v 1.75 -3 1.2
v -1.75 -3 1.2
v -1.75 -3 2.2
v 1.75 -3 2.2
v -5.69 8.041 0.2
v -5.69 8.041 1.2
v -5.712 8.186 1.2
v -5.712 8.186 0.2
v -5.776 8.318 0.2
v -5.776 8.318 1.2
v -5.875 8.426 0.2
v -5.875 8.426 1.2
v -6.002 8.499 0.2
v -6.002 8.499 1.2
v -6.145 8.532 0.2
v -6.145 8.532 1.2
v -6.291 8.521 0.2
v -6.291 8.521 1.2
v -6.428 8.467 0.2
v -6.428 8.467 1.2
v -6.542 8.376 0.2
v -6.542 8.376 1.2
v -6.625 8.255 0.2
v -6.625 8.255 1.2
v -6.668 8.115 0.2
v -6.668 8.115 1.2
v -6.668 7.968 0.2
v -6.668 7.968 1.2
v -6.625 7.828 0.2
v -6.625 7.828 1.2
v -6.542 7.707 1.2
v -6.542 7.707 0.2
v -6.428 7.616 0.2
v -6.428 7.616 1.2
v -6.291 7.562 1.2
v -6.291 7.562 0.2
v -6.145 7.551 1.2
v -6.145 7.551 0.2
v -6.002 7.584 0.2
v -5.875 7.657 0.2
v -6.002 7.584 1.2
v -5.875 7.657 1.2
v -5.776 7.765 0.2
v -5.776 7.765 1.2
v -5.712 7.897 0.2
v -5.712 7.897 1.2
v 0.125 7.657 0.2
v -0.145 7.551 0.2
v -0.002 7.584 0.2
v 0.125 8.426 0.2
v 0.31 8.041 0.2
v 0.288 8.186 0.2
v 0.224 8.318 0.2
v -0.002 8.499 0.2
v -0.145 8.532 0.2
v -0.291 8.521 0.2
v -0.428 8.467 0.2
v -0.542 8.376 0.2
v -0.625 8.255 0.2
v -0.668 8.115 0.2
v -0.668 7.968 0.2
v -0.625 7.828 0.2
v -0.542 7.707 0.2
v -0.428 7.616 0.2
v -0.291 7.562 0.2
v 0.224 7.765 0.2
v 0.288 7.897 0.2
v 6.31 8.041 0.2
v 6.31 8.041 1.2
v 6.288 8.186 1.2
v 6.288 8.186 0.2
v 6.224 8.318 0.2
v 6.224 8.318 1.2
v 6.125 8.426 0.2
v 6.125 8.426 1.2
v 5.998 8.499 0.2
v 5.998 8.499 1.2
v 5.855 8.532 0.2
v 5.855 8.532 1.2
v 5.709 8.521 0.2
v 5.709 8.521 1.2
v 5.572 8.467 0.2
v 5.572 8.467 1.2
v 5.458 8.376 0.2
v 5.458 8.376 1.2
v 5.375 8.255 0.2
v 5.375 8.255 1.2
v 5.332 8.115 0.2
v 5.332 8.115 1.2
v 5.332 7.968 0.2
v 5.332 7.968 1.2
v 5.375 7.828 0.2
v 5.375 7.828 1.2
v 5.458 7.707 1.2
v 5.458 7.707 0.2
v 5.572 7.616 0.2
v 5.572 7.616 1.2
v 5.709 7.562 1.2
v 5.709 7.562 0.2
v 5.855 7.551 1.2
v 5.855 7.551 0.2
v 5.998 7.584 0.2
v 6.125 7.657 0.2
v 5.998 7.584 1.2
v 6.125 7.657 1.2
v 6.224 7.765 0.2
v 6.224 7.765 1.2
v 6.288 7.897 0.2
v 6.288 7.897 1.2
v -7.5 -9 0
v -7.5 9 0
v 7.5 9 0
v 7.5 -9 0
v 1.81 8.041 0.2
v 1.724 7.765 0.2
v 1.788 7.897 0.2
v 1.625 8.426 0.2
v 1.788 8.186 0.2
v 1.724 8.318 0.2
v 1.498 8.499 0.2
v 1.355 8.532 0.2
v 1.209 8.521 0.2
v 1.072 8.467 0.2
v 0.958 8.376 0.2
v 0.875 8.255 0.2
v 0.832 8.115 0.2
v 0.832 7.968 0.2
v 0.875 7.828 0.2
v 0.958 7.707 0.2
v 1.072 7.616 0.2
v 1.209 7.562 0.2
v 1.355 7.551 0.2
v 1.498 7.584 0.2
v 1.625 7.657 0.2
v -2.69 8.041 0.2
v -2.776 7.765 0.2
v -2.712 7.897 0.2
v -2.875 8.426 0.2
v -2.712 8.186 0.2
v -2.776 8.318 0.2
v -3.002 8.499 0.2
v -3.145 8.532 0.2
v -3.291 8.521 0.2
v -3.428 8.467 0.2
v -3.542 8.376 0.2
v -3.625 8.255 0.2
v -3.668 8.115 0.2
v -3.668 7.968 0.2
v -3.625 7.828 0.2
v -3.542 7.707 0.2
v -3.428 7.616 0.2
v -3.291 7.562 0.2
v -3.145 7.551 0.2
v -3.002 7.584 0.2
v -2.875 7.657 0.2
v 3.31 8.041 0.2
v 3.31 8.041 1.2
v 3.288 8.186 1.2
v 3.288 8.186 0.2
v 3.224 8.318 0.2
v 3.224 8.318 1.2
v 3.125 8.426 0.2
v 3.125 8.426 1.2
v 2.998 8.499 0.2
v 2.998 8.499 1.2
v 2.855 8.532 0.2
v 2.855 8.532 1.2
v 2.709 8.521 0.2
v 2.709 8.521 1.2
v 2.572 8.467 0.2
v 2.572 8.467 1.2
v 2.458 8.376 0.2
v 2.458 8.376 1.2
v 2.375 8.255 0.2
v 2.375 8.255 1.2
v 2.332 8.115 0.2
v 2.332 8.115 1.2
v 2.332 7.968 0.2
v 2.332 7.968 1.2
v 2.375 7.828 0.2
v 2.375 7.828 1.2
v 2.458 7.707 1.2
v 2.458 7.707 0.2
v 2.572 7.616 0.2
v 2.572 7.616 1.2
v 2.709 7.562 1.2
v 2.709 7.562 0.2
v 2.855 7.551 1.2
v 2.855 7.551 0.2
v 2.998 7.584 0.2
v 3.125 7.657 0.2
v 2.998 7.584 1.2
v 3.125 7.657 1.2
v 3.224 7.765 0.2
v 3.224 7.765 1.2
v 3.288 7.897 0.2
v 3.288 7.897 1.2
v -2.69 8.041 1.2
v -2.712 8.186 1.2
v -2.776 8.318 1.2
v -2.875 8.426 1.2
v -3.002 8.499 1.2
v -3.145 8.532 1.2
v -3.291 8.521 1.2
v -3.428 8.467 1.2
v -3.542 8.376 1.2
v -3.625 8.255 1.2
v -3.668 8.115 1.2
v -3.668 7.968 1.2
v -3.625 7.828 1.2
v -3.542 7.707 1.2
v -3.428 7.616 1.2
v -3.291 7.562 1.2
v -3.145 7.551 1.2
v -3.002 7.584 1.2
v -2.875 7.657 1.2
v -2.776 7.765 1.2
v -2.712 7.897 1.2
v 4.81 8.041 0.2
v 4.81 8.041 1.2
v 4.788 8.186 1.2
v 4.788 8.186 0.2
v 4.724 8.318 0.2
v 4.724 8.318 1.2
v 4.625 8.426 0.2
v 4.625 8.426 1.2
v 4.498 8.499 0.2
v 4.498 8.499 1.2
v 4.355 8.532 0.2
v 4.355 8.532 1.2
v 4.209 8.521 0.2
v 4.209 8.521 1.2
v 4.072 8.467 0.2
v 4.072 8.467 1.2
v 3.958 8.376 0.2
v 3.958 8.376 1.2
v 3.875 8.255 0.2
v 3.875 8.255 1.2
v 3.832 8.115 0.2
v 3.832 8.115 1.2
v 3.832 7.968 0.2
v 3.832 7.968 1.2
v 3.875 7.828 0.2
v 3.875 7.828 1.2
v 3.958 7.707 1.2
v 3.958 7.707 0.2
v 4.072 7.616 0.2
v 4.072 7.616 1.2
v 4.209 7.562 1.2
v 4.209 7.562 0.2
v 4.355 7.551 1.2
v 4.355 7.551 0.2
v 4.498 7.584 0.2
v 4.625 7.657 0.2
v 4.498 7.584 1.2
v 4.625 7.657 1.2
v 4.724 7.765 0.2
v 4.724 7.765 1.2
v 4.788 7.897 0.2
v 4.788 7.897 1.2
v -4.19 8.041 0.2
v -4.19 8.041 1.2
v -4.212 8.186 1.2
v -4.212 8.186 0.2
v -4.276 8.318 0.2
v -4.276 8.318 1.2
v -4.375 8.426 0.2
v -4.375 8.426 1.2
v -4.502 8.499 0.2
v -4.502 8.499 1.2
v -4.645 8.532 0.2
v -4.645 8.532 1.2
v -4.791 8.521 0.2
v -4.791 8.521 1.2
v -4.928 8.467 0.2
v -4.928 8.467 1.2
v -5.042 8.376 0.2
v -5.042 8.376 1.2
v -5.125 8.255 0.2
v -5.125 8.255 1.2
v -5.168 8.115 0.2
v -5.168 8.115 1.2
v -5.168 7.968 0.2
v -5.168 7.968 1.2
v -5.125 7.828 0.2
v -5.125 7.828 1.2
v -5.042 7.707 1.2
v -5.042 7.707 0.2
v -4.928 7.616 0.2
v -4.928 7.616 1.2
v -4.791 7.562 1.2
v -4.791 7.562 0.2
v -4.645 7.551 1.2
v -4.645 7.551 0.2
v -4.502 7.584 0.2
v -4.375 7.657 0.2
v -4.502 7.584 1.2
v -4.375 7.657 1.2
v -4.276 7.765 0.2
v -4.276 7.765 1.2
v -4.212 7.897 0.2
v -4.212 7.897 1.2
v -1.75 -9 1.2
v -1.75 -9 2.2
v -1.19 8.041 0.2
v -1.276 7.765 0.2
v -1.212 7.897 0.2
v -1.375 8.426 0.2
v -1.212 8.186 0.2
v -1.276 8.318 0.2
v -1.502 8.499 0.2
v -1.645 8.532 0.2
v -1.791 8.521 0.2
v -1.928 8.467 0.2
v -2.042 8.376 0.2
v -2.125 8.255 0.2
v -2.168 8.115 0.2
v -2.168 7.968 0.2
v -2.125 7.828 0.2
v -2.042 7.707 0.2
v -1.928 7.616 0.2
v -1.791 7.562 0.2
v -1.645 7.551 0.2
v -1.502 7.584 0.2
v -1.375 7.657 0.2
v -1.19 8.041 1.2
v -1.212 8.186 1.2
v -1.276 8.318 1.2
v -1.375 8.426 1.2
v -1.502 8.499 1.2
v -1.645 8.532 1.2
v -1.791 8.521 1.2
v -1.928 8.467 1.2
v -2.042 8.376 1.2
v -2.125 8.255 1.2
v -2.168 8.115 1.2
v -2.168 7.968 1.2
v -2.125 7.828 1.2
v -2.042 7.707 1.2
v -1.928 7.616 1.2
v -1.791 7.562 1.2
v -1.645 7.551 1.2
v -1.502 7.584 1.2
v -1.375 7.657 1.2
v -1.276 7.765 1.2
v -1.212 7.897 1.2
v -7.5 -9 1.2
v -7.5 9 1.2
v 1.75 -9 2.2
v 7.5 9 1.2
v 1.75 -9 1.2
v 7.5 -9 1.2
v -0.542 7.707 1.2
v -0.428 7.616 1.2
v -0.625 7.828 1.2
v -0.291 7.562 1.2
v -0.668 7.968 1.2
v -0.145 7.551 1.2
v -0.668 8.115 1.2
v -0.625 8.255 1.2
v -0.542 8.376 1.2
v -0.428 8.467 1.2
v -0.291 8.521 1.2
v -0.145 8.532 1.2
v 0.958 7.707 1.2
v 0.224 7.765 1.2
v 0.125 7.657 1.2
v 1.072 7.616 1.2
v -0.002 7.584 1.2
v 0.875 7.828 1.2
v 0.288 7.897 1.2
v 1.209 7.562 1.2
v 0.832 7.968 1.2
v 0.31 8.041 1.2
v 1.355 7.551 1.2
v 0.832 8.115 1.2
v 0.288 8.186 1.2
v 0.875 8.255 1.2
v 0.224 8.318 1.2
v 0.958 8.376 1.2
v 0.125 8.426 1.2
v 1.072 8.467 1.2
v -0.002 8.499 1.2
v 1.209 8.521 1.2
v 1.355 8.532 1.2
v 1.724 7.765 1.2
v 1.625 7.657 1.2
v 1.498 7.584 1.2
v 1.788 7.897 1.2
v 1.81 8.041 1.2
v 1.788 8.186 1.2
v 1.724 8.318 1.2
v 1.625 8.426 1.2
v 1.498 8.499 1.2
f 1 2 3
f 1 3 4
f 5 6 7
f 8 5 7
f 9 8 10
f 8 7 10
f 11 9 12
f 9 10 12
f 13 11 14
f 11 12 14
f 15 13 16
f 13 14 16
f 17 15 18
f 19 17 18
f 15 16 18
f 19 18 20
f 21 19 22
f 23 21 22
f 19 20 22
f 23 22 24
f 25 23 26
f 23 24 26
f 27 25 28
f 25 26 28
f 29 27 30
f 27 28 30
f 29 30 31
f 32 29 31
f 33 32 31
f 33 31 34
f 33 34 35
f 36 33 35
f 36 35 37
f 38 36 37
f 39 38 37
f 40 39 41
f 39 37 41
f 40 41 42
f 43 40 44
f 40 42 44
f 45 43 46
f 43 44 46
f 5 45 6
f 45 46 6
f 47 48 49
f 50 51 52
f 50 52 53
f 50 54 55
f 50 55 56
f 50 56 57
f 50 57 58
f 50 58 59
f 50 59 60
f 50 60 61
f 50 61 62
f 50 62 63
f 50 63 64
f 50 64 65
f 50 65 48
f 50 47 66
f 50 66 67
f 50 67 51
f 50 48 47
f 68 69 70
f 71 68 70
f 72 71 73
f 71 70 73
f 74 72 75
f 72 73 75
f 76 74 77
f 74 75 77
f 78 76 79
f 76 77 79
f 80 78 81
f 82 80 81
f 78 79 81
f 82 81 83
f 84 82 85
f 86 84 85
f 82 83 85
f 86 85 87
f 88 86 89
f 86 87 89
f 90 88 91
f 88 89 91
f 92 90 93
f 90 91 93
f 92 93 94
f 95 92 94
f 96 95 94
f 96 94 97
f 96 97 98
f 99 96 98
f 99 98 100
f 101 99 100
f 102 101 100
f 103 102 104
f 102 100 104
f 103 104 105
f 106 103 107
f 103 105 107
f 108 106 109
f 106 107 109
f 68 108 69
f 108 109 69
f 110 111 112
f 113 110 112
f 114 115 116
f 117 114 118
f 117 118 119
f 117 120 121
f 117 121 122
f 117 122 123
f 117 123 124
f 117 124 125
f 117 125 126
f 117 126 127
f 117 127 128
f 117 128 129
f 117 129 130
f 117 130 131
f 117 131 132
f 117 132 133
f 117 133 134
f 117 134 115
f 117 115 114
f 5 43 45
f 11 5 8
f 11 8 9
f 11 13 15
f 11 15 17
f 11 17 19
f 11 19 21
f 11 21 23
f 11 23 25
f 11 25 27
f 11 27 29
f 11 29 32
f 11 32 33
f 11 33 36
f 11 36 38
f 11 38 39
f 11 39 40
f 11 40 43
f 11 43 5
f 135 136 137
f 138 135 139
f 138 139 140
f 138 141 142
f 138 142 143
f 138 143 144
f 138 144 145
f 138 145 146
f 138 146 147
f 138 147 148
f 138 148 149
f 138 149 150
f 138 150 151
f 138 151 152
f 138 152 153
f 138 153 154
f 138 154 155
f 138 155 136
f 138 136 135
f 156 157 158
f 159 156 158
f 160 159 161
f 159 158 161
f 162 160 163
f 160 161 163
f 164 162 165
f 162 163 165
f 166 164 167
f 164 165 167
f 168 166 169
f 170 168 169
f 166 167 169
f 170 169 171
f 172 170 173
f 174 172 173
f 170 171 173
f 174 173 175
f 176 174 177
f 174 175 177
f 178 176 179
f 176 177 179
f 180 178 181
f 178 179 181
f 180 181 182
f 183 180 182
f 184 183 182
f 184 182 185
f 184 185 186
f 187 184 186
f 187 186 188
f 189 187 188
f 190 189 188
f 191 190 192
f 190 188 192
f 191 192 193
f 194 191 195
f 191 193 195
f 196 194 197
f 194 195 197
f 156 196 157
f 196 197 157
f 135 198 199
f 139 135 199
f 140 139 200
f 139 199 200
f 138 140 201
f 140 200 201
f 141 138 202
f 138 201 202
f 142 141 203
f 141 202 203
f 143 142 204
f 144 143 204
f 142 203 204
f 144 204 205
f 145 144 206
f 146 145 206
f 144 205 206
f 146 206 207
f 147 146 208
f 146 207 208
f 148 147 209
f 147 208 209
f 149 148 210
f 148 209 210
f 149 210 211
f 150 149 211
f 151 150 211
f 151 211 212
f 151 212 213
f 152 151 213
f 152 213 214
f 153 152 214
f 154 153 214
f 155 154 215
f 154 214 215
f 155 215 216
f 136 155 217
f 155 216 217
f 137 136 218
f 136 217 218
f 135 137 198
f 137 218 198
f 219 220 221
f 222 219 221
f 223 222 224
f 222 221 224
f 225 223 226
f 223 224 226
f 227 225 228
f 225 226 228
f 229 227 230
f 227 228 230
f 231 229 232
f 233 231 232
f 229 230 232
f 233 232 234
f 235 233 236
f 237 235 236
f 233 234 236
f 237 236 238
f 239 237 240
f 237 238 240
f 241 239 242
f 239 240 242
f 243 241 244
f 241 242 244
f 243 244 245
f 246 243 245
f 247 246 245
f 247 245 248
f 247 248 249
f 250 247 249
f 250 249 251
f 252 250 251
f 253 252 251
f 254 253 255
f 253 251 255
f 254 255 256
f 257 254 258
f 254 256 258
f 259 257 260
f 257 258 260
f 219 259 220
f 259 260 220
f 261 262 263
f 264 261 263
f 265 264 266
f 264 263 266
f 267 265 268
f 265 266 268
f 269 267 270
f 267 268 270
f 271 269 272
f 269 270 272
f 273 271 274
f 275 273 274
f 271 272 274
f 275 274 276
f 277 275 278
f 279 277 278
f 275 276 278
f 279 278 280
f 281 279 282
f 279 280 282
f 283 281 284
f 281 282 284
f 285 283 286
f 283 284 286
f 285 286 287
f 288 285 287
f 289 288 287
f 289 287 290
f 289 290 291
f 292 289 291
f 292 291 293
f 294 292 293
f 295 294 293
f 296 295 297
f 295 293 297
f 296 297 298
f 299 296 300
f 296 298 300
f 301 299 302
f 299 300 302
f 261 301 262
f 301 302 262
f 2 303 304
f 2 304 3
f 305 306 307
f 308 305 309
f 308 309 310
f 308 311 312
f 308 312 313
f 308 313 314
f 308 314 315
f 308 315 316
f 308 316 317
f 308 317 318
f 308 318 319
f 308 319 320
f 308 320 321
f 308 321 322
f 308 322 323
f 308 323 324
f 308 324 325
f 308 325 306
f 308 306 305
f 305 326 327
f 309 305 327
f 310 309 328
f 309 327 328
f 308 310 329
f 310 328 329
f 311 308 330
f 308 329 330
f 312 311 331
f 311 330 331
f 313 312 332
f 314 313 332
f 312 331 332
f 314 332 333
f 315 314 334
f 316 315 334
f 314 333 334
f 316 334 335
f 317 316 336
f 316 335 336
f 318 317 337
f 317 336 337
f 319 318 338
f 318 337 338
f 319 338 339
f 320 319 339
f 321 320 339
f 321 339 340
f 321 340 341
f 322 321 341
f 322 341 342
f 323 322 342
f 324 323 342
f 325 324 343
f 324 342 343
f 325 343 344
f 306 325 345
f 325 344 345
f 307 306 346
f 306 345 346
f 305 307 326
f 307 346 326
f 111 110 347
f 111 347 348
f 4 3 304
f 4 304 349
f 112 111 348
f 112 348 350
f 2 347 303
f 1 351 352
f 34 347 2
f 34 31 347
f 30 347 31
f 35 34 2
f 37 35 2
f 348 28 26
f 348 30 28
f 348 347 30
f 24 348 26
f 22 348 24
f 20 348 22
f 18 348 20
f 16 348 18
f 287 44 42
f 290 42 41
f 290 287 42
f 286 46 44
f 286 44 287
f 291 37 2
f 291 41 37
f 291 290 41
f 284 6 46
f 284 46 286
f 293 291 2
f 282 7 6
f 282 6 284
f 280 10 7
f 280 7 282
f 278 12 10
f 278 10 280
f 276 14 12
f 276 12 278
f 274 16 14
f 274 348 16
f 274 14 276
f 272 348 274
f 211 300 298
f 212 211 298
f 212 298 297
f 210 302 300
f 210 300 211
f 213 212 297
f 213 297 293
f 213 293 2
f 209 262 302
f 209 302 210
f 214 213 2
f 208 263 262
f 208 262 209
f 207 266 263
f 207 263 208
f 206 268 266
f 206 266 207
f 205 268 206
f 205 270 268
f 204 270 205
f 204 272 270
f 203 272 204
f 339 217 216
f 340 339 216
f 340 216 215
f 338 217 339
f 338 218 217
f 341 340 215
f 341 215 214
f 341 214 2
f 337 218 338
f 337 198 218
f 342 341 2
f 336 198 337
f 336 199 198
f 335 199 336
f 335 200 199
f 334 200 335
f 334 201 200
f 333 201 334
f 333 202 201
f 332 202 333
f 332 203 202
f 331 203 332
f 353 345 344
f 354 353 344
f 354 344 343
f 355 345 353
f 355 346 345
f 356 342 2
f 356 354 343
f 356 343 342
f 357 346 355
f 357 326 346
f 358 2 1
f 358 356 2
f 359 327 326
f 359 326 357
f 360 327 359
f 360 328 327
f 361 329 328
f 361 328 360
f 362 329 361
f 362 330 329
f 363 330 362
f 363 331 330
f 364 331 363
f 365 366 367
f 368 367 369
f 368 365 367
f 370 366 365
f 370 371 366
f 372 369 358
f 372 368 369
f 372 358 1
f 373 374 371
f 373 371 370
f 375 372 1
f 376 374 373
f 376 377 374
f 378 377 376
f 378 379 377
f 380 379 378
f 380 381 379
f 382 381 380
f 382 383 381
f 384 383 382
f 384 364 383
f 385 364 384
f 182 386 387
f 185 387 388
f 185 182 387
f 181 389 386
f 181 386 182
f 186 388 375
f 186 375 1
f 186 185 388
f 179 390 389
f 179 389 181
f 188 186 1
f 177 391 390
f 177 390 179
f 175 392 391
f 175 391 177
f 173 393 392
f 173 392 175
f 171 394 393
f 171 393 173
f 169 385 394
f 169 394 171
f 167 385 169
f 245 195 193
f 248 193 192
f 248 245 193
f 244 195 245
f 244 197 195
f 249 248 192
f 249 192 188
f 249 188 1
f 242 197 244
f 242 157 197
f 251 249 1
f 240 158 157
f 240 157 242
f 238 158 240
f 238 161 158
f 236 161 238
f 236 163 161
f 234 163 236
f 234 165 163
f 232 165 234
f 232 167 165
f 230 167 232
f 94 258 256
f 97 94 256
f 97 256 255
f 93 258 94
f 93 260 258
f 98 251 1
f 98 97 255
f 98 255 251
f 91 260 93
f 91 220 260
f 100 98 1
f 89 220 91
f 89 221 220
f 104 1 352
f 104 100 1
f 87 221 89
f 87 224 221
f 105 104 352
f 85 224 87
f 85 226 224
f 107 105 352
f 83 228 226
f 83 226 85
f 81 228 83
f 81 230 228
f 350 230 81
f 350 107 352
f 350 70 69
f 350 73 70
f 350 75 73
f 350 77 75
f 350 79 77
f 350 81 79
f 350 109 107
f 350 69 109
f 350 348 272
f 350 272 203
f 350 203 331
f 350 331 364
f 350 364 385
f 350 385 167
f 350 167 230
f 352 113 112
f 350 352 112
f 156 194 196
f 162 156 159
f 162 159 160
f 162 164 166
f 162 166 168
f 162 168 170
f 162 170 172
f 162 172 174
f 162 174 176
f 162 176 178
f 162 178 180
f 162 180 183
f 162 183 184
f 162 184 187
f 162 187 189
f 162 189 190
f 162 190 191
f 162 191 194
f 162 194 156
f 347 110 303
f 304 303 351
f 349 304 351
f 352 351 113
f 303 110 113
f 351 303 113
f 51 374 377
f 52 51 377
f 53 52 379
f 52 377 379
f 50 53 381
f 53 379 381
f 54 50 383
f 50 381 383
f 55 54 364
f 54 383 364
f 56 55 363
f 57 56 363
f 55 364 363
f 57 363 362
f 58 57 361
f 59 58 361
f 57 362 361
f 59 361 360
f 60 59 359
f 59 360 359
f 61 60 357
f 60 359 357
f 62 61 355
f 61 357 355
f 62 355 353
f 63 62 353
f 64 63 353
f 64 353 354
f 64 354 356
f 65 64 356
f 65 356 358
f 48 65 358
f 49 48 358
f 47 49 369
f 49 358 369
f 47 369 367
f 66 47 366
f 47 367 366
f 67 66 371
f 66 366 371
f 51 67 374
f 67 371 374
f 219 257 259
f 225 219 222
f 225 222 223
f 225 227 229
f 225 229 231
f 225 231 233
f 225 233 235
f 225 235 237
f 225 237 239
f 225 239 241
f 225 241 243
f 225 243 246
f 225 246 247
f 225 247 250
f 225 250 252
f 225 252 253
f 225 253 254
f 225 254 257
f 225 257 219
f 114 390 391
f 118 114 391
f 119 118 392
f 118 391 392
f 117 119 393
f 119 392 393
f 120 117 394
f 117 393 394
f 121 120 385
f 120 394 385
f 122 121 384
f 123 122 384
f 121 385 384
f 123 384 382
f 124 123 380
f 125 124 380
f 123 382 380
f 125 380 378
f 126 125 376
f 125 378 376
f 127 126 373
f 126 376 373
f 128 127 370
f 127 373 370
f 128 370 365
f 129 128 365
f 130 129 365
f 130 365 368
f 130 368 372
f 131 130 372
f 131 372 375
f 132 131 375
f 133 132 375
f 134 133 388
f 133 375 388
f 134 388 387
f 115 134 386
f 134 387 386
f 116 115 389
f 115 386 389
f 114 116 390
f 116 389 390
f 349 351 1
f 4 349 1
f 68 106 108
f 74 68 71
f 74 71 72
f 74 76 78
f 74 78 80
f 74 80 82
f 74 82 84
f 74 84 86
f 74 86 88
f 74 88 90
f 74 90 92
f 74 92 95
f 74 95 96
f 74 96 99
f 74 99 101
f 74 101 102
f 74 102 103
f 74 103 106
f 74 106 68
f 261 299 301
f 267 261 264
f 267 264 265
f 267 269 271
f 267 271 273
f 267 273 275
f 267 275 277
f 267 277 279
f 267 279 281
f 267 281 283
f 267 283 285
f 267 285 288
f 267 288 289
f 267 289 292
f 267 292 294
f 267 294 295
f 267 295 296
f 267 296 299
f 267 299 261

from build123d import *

# Parameters (mm, degrees)
SKETCH1_W           = 15
SKETCH1_H           = 18
BOSS_EXTRUDE1_DEPTH = 1.2
SKETCH2_W           = 3.5
SKETCH2_H           = 6
BOSS_EXTRUDE2_DEPTH = 1
SKETCH3_R           = 0.491511221
CUT_EXTRUDE1_DEPTH  = 1


with BuildPart() as part:
    # Sketch1 → Boss-Extrude1 (new body)
    with BuildSketch(Plane.XY):
        Rectangle(SKETCH1_W, SKETCH1_H)
    extrude(amount=BOSS_EXTRUDE1_DEPTH)

    # Sketch2 → Boss-Extrude2 (add)
    with BuildSketch(Plane.XY.offset(1.2)):
        with Locations((0, -6)):
            Rectangle(SKETCH2_W, SKETCH2_H)
    extrude(amount=BOSS_EXTRUDE2_DEPTH)

    # Sketch3 → Cut-Extrude1 (cut)
    with BuildSketch(Plane.XY.offset(1.2)):
        with Locations((-6.181907245, 8.041418738)):
            Circle(SKETCH3_R)
        with Locations((-4.681907245, 8.041418738)):
            Circle(SKETCH3_R)
        with Locations((-3.181907245, 8.041418738)):
            Circle(SKETCH3_R)
        with Locations((-1.681907245, 8.041418738)):
            Circle(SKETCH3_R)
        with Locations((-0.181907245, 8.041418738)):
            Circle(SKETCH3_R)
        with Locations((1.318092755, 8.041418738)):
            Circle(SKETCH3_R)
        with Locations((2.818092755, 8.041418738)):
            Circle(SKETCH3_R)
        with Locations((4.318092755, 8.041418738)):
            Circle(SKETCH3_R)
        with Locations((5.818092755, 8.041418738)):
            Circle(SKETCH3_R)
    extrude(amount=-CUT_EXTRUDE1_DEPTH, mode=Mode.SUBTRACT)


solid = part.part
